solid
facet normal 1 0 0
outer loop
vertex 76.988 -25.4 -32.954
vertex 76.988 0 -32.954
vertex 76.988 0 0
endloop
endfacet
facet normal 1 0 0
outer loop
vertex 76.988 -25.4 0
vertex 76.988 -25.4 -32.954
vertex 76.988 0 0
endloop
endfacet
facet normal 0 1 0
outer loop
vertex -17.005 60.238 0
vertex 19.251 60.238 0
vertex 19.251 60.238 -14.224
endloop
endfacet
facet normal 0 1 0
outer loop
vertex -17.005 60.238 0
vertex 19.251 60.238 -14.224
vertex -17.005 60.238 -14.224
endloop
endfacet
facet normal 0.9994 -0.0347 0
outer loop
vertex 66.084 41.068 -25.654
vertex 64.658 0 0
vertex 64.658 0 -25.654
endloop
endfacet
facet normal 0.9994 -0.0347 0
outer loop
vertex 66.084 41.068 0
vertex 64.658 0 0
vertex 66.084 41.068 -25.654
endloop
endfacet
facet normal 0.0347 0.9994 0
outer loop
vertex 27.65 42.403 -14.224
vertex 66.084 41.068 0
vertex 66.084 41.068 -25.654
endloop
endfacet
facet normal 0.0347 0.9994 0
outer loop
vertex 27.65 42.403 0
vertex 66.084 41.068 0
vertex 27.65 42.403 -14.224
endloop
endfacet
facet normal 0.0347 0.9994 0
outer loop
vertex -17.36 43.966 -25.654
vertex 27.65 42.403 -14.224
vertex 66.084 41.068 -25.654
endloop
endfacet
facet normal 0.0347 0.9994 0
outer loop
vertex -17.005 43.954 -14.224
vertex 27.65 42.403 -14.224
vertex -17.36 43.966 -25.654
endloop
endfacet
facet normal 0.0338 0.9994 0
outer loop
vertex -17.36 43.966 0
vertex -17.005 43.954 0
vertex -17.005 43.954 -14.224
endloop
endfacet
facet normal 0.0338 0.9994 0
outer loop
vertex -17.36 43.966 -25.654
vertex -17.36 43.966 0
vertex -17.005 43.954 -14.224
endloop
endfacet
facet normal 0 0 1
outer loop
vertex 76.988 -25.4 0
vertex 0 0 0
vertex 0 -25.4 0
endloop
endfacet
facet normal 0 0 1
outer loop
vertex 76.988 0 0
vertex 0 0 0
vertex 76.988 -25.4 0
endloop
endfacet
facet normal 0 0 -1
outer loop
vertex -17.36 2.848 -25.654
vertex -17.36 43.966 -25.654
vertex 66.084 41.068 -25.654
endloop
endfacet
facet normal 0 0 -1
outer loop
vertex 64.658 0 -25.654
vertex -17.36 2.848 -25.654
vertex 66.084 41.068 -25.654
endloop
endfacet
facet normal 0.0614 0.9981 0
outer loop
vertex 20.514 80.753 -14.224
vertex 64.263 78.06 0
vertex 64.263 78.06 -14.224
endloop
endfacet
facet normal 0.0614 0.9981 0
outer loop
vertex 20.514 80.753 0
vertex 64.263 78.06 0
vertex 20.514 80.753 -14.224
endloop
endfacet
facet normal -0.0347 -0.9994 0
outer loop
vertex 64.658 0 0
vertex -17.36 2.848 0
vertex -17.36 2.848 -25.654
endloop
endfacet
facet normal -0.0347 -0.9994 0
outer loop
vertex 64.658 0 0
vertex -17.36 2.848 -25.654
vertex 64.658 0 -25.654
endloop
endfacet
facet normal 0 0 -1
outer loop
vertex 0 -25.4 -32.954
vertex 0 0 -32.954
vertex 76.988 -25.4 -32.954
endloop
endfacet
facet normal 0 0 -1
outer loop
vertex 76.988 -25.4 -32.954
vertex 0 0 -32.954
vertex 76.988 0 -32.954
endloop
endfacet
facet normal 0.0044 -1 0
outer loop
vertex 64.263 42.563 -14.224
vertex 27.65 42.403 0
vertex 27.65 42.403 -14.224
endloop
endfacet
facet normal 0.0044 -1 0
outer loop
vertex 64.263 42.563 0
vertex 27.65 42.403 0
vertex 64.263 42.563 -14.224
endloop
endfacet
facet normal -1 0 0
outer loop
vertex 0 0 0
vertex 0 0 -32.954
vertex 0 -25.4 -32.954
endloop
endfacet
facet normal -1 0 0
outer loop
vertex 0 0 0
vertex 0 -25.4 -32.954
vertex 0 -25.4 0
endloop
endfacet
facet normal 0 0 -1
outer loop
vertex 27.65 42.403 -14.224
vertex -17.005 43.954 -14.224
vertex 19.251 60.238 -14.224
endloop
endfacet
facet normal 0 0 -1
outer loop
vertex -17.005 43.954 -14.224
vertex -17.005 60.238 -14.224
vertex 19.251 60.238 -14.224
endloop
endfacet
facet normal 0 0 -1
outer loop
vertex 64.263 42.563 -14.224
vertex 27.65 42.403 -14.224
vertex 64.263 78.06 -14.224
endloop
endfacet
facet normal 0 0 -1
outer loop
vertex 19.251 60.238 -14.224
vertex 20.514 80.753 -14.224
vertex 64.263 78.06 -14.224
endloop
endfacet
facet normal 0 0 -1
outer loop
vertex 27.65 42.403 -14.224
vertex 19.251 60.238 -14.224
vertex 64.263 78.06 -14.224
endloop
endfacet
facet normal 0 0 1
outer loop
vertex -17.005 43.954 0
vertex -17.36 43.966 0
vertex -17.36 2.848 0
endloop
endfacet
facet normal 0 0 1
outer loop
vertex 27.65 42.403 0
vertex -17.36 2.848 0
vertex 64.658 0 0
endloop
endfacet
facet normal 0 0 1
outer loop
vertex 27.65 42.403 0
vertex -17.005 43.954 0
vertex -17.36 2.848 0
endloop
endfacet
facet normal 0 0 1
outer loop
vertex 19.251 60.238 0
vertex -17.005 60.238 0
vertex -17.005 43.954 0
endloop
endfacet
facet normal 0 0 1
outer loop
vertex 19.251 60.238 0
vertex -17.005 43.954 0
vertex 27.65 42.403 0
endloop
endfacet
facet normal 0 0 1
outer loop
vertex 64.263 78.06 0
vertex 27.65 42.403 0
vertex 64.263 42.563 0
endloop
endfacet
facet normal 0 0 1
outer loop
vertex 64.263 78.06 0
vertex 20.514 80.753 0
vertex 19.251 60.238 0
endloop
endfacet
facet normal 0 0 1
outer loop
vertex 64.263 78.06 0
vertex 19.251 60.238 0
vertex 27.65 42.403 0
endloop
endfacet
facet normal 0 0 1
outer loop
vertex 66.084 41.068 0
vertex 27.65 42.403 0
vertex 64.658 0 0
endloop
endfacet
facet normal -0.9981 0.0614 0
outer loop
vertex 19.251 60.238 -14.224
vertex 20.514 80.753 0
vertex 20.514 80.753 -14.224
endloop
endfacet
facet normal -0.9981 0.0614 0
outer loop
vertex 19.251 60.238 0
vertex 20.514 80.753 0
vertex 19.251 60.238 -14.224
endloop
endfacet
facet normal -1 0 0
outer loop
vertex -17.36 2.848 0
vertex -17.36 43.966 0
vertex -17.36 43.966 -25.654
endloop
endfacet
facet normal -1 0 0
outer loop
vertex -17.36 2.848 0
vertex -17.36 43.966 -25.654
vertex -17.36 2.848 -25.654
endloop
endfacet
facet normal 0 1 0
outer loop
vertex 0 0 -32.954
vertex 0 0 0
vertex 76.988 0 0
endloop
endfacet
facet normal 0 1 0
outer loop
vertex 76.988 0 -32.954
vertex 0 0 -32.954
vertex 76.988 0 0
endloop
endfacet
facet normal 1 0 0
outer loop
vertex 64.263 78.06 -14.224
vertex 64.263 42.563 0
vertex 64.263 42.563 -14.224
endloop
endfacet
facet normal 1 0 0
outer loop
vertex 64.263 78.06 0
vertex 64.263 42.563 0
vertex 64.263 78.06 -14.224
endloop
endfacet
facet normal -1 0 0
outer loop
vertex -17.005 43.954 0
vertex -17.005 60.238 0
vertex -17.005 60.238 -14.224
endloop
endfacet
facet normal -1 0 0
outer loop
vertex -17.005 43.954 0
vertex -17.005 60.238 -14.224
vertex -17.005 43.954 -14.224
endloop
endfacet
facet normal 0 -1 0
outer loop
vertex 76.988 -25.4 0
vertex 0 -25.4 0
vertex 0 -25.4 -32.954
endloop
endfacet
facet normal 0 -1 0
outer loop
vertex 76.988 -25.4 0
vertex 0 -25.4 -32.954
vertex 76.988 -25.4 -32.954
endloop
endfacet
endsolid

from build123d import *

# Parameters (mm, degrees)
F0_W     = 76.988034
F0_H     = 32.953762
F1_DEPTH = 25.4
F3_DEPTH = 25.654
F5_DEPTH = 14.224


with BuildPart() as f1:
    # F0 (on Front) → F1 (new body)
    with BuildSketch(Plane.XZ):
        with Locations((38.494017, -16.476881)):
            Rectangle(F0_W, F0_H)
    extrude(amount=F1_DEPTH)


with BuildPart() as f3:
    # F2 (on Top) → F3 (new body)
    with BuildSketch(Plane.XY):
        Polygon((-17.359633, 43.965994), (-17.359633, 12.949505), (-17.359633, 2.847992), (64.658187, 0), (66.084251, 41.068484), align=None)
    extrude(amount=-F3_DEPTH)

    # F4 (on Top) → F5 (join)
    with BuildSketch(Plane.XY):
        Polygon((-17.004775, 42.208083), (64.26324, 42.562939), (64.26324, 78.059629), (20.51433, 80.752961), (19.251338, 60.237666), (-17.004775, 60.237666), align=None)
    extrude(amount=-F5_DEPTH)


solid = Compound([f1.part, f3.part])
